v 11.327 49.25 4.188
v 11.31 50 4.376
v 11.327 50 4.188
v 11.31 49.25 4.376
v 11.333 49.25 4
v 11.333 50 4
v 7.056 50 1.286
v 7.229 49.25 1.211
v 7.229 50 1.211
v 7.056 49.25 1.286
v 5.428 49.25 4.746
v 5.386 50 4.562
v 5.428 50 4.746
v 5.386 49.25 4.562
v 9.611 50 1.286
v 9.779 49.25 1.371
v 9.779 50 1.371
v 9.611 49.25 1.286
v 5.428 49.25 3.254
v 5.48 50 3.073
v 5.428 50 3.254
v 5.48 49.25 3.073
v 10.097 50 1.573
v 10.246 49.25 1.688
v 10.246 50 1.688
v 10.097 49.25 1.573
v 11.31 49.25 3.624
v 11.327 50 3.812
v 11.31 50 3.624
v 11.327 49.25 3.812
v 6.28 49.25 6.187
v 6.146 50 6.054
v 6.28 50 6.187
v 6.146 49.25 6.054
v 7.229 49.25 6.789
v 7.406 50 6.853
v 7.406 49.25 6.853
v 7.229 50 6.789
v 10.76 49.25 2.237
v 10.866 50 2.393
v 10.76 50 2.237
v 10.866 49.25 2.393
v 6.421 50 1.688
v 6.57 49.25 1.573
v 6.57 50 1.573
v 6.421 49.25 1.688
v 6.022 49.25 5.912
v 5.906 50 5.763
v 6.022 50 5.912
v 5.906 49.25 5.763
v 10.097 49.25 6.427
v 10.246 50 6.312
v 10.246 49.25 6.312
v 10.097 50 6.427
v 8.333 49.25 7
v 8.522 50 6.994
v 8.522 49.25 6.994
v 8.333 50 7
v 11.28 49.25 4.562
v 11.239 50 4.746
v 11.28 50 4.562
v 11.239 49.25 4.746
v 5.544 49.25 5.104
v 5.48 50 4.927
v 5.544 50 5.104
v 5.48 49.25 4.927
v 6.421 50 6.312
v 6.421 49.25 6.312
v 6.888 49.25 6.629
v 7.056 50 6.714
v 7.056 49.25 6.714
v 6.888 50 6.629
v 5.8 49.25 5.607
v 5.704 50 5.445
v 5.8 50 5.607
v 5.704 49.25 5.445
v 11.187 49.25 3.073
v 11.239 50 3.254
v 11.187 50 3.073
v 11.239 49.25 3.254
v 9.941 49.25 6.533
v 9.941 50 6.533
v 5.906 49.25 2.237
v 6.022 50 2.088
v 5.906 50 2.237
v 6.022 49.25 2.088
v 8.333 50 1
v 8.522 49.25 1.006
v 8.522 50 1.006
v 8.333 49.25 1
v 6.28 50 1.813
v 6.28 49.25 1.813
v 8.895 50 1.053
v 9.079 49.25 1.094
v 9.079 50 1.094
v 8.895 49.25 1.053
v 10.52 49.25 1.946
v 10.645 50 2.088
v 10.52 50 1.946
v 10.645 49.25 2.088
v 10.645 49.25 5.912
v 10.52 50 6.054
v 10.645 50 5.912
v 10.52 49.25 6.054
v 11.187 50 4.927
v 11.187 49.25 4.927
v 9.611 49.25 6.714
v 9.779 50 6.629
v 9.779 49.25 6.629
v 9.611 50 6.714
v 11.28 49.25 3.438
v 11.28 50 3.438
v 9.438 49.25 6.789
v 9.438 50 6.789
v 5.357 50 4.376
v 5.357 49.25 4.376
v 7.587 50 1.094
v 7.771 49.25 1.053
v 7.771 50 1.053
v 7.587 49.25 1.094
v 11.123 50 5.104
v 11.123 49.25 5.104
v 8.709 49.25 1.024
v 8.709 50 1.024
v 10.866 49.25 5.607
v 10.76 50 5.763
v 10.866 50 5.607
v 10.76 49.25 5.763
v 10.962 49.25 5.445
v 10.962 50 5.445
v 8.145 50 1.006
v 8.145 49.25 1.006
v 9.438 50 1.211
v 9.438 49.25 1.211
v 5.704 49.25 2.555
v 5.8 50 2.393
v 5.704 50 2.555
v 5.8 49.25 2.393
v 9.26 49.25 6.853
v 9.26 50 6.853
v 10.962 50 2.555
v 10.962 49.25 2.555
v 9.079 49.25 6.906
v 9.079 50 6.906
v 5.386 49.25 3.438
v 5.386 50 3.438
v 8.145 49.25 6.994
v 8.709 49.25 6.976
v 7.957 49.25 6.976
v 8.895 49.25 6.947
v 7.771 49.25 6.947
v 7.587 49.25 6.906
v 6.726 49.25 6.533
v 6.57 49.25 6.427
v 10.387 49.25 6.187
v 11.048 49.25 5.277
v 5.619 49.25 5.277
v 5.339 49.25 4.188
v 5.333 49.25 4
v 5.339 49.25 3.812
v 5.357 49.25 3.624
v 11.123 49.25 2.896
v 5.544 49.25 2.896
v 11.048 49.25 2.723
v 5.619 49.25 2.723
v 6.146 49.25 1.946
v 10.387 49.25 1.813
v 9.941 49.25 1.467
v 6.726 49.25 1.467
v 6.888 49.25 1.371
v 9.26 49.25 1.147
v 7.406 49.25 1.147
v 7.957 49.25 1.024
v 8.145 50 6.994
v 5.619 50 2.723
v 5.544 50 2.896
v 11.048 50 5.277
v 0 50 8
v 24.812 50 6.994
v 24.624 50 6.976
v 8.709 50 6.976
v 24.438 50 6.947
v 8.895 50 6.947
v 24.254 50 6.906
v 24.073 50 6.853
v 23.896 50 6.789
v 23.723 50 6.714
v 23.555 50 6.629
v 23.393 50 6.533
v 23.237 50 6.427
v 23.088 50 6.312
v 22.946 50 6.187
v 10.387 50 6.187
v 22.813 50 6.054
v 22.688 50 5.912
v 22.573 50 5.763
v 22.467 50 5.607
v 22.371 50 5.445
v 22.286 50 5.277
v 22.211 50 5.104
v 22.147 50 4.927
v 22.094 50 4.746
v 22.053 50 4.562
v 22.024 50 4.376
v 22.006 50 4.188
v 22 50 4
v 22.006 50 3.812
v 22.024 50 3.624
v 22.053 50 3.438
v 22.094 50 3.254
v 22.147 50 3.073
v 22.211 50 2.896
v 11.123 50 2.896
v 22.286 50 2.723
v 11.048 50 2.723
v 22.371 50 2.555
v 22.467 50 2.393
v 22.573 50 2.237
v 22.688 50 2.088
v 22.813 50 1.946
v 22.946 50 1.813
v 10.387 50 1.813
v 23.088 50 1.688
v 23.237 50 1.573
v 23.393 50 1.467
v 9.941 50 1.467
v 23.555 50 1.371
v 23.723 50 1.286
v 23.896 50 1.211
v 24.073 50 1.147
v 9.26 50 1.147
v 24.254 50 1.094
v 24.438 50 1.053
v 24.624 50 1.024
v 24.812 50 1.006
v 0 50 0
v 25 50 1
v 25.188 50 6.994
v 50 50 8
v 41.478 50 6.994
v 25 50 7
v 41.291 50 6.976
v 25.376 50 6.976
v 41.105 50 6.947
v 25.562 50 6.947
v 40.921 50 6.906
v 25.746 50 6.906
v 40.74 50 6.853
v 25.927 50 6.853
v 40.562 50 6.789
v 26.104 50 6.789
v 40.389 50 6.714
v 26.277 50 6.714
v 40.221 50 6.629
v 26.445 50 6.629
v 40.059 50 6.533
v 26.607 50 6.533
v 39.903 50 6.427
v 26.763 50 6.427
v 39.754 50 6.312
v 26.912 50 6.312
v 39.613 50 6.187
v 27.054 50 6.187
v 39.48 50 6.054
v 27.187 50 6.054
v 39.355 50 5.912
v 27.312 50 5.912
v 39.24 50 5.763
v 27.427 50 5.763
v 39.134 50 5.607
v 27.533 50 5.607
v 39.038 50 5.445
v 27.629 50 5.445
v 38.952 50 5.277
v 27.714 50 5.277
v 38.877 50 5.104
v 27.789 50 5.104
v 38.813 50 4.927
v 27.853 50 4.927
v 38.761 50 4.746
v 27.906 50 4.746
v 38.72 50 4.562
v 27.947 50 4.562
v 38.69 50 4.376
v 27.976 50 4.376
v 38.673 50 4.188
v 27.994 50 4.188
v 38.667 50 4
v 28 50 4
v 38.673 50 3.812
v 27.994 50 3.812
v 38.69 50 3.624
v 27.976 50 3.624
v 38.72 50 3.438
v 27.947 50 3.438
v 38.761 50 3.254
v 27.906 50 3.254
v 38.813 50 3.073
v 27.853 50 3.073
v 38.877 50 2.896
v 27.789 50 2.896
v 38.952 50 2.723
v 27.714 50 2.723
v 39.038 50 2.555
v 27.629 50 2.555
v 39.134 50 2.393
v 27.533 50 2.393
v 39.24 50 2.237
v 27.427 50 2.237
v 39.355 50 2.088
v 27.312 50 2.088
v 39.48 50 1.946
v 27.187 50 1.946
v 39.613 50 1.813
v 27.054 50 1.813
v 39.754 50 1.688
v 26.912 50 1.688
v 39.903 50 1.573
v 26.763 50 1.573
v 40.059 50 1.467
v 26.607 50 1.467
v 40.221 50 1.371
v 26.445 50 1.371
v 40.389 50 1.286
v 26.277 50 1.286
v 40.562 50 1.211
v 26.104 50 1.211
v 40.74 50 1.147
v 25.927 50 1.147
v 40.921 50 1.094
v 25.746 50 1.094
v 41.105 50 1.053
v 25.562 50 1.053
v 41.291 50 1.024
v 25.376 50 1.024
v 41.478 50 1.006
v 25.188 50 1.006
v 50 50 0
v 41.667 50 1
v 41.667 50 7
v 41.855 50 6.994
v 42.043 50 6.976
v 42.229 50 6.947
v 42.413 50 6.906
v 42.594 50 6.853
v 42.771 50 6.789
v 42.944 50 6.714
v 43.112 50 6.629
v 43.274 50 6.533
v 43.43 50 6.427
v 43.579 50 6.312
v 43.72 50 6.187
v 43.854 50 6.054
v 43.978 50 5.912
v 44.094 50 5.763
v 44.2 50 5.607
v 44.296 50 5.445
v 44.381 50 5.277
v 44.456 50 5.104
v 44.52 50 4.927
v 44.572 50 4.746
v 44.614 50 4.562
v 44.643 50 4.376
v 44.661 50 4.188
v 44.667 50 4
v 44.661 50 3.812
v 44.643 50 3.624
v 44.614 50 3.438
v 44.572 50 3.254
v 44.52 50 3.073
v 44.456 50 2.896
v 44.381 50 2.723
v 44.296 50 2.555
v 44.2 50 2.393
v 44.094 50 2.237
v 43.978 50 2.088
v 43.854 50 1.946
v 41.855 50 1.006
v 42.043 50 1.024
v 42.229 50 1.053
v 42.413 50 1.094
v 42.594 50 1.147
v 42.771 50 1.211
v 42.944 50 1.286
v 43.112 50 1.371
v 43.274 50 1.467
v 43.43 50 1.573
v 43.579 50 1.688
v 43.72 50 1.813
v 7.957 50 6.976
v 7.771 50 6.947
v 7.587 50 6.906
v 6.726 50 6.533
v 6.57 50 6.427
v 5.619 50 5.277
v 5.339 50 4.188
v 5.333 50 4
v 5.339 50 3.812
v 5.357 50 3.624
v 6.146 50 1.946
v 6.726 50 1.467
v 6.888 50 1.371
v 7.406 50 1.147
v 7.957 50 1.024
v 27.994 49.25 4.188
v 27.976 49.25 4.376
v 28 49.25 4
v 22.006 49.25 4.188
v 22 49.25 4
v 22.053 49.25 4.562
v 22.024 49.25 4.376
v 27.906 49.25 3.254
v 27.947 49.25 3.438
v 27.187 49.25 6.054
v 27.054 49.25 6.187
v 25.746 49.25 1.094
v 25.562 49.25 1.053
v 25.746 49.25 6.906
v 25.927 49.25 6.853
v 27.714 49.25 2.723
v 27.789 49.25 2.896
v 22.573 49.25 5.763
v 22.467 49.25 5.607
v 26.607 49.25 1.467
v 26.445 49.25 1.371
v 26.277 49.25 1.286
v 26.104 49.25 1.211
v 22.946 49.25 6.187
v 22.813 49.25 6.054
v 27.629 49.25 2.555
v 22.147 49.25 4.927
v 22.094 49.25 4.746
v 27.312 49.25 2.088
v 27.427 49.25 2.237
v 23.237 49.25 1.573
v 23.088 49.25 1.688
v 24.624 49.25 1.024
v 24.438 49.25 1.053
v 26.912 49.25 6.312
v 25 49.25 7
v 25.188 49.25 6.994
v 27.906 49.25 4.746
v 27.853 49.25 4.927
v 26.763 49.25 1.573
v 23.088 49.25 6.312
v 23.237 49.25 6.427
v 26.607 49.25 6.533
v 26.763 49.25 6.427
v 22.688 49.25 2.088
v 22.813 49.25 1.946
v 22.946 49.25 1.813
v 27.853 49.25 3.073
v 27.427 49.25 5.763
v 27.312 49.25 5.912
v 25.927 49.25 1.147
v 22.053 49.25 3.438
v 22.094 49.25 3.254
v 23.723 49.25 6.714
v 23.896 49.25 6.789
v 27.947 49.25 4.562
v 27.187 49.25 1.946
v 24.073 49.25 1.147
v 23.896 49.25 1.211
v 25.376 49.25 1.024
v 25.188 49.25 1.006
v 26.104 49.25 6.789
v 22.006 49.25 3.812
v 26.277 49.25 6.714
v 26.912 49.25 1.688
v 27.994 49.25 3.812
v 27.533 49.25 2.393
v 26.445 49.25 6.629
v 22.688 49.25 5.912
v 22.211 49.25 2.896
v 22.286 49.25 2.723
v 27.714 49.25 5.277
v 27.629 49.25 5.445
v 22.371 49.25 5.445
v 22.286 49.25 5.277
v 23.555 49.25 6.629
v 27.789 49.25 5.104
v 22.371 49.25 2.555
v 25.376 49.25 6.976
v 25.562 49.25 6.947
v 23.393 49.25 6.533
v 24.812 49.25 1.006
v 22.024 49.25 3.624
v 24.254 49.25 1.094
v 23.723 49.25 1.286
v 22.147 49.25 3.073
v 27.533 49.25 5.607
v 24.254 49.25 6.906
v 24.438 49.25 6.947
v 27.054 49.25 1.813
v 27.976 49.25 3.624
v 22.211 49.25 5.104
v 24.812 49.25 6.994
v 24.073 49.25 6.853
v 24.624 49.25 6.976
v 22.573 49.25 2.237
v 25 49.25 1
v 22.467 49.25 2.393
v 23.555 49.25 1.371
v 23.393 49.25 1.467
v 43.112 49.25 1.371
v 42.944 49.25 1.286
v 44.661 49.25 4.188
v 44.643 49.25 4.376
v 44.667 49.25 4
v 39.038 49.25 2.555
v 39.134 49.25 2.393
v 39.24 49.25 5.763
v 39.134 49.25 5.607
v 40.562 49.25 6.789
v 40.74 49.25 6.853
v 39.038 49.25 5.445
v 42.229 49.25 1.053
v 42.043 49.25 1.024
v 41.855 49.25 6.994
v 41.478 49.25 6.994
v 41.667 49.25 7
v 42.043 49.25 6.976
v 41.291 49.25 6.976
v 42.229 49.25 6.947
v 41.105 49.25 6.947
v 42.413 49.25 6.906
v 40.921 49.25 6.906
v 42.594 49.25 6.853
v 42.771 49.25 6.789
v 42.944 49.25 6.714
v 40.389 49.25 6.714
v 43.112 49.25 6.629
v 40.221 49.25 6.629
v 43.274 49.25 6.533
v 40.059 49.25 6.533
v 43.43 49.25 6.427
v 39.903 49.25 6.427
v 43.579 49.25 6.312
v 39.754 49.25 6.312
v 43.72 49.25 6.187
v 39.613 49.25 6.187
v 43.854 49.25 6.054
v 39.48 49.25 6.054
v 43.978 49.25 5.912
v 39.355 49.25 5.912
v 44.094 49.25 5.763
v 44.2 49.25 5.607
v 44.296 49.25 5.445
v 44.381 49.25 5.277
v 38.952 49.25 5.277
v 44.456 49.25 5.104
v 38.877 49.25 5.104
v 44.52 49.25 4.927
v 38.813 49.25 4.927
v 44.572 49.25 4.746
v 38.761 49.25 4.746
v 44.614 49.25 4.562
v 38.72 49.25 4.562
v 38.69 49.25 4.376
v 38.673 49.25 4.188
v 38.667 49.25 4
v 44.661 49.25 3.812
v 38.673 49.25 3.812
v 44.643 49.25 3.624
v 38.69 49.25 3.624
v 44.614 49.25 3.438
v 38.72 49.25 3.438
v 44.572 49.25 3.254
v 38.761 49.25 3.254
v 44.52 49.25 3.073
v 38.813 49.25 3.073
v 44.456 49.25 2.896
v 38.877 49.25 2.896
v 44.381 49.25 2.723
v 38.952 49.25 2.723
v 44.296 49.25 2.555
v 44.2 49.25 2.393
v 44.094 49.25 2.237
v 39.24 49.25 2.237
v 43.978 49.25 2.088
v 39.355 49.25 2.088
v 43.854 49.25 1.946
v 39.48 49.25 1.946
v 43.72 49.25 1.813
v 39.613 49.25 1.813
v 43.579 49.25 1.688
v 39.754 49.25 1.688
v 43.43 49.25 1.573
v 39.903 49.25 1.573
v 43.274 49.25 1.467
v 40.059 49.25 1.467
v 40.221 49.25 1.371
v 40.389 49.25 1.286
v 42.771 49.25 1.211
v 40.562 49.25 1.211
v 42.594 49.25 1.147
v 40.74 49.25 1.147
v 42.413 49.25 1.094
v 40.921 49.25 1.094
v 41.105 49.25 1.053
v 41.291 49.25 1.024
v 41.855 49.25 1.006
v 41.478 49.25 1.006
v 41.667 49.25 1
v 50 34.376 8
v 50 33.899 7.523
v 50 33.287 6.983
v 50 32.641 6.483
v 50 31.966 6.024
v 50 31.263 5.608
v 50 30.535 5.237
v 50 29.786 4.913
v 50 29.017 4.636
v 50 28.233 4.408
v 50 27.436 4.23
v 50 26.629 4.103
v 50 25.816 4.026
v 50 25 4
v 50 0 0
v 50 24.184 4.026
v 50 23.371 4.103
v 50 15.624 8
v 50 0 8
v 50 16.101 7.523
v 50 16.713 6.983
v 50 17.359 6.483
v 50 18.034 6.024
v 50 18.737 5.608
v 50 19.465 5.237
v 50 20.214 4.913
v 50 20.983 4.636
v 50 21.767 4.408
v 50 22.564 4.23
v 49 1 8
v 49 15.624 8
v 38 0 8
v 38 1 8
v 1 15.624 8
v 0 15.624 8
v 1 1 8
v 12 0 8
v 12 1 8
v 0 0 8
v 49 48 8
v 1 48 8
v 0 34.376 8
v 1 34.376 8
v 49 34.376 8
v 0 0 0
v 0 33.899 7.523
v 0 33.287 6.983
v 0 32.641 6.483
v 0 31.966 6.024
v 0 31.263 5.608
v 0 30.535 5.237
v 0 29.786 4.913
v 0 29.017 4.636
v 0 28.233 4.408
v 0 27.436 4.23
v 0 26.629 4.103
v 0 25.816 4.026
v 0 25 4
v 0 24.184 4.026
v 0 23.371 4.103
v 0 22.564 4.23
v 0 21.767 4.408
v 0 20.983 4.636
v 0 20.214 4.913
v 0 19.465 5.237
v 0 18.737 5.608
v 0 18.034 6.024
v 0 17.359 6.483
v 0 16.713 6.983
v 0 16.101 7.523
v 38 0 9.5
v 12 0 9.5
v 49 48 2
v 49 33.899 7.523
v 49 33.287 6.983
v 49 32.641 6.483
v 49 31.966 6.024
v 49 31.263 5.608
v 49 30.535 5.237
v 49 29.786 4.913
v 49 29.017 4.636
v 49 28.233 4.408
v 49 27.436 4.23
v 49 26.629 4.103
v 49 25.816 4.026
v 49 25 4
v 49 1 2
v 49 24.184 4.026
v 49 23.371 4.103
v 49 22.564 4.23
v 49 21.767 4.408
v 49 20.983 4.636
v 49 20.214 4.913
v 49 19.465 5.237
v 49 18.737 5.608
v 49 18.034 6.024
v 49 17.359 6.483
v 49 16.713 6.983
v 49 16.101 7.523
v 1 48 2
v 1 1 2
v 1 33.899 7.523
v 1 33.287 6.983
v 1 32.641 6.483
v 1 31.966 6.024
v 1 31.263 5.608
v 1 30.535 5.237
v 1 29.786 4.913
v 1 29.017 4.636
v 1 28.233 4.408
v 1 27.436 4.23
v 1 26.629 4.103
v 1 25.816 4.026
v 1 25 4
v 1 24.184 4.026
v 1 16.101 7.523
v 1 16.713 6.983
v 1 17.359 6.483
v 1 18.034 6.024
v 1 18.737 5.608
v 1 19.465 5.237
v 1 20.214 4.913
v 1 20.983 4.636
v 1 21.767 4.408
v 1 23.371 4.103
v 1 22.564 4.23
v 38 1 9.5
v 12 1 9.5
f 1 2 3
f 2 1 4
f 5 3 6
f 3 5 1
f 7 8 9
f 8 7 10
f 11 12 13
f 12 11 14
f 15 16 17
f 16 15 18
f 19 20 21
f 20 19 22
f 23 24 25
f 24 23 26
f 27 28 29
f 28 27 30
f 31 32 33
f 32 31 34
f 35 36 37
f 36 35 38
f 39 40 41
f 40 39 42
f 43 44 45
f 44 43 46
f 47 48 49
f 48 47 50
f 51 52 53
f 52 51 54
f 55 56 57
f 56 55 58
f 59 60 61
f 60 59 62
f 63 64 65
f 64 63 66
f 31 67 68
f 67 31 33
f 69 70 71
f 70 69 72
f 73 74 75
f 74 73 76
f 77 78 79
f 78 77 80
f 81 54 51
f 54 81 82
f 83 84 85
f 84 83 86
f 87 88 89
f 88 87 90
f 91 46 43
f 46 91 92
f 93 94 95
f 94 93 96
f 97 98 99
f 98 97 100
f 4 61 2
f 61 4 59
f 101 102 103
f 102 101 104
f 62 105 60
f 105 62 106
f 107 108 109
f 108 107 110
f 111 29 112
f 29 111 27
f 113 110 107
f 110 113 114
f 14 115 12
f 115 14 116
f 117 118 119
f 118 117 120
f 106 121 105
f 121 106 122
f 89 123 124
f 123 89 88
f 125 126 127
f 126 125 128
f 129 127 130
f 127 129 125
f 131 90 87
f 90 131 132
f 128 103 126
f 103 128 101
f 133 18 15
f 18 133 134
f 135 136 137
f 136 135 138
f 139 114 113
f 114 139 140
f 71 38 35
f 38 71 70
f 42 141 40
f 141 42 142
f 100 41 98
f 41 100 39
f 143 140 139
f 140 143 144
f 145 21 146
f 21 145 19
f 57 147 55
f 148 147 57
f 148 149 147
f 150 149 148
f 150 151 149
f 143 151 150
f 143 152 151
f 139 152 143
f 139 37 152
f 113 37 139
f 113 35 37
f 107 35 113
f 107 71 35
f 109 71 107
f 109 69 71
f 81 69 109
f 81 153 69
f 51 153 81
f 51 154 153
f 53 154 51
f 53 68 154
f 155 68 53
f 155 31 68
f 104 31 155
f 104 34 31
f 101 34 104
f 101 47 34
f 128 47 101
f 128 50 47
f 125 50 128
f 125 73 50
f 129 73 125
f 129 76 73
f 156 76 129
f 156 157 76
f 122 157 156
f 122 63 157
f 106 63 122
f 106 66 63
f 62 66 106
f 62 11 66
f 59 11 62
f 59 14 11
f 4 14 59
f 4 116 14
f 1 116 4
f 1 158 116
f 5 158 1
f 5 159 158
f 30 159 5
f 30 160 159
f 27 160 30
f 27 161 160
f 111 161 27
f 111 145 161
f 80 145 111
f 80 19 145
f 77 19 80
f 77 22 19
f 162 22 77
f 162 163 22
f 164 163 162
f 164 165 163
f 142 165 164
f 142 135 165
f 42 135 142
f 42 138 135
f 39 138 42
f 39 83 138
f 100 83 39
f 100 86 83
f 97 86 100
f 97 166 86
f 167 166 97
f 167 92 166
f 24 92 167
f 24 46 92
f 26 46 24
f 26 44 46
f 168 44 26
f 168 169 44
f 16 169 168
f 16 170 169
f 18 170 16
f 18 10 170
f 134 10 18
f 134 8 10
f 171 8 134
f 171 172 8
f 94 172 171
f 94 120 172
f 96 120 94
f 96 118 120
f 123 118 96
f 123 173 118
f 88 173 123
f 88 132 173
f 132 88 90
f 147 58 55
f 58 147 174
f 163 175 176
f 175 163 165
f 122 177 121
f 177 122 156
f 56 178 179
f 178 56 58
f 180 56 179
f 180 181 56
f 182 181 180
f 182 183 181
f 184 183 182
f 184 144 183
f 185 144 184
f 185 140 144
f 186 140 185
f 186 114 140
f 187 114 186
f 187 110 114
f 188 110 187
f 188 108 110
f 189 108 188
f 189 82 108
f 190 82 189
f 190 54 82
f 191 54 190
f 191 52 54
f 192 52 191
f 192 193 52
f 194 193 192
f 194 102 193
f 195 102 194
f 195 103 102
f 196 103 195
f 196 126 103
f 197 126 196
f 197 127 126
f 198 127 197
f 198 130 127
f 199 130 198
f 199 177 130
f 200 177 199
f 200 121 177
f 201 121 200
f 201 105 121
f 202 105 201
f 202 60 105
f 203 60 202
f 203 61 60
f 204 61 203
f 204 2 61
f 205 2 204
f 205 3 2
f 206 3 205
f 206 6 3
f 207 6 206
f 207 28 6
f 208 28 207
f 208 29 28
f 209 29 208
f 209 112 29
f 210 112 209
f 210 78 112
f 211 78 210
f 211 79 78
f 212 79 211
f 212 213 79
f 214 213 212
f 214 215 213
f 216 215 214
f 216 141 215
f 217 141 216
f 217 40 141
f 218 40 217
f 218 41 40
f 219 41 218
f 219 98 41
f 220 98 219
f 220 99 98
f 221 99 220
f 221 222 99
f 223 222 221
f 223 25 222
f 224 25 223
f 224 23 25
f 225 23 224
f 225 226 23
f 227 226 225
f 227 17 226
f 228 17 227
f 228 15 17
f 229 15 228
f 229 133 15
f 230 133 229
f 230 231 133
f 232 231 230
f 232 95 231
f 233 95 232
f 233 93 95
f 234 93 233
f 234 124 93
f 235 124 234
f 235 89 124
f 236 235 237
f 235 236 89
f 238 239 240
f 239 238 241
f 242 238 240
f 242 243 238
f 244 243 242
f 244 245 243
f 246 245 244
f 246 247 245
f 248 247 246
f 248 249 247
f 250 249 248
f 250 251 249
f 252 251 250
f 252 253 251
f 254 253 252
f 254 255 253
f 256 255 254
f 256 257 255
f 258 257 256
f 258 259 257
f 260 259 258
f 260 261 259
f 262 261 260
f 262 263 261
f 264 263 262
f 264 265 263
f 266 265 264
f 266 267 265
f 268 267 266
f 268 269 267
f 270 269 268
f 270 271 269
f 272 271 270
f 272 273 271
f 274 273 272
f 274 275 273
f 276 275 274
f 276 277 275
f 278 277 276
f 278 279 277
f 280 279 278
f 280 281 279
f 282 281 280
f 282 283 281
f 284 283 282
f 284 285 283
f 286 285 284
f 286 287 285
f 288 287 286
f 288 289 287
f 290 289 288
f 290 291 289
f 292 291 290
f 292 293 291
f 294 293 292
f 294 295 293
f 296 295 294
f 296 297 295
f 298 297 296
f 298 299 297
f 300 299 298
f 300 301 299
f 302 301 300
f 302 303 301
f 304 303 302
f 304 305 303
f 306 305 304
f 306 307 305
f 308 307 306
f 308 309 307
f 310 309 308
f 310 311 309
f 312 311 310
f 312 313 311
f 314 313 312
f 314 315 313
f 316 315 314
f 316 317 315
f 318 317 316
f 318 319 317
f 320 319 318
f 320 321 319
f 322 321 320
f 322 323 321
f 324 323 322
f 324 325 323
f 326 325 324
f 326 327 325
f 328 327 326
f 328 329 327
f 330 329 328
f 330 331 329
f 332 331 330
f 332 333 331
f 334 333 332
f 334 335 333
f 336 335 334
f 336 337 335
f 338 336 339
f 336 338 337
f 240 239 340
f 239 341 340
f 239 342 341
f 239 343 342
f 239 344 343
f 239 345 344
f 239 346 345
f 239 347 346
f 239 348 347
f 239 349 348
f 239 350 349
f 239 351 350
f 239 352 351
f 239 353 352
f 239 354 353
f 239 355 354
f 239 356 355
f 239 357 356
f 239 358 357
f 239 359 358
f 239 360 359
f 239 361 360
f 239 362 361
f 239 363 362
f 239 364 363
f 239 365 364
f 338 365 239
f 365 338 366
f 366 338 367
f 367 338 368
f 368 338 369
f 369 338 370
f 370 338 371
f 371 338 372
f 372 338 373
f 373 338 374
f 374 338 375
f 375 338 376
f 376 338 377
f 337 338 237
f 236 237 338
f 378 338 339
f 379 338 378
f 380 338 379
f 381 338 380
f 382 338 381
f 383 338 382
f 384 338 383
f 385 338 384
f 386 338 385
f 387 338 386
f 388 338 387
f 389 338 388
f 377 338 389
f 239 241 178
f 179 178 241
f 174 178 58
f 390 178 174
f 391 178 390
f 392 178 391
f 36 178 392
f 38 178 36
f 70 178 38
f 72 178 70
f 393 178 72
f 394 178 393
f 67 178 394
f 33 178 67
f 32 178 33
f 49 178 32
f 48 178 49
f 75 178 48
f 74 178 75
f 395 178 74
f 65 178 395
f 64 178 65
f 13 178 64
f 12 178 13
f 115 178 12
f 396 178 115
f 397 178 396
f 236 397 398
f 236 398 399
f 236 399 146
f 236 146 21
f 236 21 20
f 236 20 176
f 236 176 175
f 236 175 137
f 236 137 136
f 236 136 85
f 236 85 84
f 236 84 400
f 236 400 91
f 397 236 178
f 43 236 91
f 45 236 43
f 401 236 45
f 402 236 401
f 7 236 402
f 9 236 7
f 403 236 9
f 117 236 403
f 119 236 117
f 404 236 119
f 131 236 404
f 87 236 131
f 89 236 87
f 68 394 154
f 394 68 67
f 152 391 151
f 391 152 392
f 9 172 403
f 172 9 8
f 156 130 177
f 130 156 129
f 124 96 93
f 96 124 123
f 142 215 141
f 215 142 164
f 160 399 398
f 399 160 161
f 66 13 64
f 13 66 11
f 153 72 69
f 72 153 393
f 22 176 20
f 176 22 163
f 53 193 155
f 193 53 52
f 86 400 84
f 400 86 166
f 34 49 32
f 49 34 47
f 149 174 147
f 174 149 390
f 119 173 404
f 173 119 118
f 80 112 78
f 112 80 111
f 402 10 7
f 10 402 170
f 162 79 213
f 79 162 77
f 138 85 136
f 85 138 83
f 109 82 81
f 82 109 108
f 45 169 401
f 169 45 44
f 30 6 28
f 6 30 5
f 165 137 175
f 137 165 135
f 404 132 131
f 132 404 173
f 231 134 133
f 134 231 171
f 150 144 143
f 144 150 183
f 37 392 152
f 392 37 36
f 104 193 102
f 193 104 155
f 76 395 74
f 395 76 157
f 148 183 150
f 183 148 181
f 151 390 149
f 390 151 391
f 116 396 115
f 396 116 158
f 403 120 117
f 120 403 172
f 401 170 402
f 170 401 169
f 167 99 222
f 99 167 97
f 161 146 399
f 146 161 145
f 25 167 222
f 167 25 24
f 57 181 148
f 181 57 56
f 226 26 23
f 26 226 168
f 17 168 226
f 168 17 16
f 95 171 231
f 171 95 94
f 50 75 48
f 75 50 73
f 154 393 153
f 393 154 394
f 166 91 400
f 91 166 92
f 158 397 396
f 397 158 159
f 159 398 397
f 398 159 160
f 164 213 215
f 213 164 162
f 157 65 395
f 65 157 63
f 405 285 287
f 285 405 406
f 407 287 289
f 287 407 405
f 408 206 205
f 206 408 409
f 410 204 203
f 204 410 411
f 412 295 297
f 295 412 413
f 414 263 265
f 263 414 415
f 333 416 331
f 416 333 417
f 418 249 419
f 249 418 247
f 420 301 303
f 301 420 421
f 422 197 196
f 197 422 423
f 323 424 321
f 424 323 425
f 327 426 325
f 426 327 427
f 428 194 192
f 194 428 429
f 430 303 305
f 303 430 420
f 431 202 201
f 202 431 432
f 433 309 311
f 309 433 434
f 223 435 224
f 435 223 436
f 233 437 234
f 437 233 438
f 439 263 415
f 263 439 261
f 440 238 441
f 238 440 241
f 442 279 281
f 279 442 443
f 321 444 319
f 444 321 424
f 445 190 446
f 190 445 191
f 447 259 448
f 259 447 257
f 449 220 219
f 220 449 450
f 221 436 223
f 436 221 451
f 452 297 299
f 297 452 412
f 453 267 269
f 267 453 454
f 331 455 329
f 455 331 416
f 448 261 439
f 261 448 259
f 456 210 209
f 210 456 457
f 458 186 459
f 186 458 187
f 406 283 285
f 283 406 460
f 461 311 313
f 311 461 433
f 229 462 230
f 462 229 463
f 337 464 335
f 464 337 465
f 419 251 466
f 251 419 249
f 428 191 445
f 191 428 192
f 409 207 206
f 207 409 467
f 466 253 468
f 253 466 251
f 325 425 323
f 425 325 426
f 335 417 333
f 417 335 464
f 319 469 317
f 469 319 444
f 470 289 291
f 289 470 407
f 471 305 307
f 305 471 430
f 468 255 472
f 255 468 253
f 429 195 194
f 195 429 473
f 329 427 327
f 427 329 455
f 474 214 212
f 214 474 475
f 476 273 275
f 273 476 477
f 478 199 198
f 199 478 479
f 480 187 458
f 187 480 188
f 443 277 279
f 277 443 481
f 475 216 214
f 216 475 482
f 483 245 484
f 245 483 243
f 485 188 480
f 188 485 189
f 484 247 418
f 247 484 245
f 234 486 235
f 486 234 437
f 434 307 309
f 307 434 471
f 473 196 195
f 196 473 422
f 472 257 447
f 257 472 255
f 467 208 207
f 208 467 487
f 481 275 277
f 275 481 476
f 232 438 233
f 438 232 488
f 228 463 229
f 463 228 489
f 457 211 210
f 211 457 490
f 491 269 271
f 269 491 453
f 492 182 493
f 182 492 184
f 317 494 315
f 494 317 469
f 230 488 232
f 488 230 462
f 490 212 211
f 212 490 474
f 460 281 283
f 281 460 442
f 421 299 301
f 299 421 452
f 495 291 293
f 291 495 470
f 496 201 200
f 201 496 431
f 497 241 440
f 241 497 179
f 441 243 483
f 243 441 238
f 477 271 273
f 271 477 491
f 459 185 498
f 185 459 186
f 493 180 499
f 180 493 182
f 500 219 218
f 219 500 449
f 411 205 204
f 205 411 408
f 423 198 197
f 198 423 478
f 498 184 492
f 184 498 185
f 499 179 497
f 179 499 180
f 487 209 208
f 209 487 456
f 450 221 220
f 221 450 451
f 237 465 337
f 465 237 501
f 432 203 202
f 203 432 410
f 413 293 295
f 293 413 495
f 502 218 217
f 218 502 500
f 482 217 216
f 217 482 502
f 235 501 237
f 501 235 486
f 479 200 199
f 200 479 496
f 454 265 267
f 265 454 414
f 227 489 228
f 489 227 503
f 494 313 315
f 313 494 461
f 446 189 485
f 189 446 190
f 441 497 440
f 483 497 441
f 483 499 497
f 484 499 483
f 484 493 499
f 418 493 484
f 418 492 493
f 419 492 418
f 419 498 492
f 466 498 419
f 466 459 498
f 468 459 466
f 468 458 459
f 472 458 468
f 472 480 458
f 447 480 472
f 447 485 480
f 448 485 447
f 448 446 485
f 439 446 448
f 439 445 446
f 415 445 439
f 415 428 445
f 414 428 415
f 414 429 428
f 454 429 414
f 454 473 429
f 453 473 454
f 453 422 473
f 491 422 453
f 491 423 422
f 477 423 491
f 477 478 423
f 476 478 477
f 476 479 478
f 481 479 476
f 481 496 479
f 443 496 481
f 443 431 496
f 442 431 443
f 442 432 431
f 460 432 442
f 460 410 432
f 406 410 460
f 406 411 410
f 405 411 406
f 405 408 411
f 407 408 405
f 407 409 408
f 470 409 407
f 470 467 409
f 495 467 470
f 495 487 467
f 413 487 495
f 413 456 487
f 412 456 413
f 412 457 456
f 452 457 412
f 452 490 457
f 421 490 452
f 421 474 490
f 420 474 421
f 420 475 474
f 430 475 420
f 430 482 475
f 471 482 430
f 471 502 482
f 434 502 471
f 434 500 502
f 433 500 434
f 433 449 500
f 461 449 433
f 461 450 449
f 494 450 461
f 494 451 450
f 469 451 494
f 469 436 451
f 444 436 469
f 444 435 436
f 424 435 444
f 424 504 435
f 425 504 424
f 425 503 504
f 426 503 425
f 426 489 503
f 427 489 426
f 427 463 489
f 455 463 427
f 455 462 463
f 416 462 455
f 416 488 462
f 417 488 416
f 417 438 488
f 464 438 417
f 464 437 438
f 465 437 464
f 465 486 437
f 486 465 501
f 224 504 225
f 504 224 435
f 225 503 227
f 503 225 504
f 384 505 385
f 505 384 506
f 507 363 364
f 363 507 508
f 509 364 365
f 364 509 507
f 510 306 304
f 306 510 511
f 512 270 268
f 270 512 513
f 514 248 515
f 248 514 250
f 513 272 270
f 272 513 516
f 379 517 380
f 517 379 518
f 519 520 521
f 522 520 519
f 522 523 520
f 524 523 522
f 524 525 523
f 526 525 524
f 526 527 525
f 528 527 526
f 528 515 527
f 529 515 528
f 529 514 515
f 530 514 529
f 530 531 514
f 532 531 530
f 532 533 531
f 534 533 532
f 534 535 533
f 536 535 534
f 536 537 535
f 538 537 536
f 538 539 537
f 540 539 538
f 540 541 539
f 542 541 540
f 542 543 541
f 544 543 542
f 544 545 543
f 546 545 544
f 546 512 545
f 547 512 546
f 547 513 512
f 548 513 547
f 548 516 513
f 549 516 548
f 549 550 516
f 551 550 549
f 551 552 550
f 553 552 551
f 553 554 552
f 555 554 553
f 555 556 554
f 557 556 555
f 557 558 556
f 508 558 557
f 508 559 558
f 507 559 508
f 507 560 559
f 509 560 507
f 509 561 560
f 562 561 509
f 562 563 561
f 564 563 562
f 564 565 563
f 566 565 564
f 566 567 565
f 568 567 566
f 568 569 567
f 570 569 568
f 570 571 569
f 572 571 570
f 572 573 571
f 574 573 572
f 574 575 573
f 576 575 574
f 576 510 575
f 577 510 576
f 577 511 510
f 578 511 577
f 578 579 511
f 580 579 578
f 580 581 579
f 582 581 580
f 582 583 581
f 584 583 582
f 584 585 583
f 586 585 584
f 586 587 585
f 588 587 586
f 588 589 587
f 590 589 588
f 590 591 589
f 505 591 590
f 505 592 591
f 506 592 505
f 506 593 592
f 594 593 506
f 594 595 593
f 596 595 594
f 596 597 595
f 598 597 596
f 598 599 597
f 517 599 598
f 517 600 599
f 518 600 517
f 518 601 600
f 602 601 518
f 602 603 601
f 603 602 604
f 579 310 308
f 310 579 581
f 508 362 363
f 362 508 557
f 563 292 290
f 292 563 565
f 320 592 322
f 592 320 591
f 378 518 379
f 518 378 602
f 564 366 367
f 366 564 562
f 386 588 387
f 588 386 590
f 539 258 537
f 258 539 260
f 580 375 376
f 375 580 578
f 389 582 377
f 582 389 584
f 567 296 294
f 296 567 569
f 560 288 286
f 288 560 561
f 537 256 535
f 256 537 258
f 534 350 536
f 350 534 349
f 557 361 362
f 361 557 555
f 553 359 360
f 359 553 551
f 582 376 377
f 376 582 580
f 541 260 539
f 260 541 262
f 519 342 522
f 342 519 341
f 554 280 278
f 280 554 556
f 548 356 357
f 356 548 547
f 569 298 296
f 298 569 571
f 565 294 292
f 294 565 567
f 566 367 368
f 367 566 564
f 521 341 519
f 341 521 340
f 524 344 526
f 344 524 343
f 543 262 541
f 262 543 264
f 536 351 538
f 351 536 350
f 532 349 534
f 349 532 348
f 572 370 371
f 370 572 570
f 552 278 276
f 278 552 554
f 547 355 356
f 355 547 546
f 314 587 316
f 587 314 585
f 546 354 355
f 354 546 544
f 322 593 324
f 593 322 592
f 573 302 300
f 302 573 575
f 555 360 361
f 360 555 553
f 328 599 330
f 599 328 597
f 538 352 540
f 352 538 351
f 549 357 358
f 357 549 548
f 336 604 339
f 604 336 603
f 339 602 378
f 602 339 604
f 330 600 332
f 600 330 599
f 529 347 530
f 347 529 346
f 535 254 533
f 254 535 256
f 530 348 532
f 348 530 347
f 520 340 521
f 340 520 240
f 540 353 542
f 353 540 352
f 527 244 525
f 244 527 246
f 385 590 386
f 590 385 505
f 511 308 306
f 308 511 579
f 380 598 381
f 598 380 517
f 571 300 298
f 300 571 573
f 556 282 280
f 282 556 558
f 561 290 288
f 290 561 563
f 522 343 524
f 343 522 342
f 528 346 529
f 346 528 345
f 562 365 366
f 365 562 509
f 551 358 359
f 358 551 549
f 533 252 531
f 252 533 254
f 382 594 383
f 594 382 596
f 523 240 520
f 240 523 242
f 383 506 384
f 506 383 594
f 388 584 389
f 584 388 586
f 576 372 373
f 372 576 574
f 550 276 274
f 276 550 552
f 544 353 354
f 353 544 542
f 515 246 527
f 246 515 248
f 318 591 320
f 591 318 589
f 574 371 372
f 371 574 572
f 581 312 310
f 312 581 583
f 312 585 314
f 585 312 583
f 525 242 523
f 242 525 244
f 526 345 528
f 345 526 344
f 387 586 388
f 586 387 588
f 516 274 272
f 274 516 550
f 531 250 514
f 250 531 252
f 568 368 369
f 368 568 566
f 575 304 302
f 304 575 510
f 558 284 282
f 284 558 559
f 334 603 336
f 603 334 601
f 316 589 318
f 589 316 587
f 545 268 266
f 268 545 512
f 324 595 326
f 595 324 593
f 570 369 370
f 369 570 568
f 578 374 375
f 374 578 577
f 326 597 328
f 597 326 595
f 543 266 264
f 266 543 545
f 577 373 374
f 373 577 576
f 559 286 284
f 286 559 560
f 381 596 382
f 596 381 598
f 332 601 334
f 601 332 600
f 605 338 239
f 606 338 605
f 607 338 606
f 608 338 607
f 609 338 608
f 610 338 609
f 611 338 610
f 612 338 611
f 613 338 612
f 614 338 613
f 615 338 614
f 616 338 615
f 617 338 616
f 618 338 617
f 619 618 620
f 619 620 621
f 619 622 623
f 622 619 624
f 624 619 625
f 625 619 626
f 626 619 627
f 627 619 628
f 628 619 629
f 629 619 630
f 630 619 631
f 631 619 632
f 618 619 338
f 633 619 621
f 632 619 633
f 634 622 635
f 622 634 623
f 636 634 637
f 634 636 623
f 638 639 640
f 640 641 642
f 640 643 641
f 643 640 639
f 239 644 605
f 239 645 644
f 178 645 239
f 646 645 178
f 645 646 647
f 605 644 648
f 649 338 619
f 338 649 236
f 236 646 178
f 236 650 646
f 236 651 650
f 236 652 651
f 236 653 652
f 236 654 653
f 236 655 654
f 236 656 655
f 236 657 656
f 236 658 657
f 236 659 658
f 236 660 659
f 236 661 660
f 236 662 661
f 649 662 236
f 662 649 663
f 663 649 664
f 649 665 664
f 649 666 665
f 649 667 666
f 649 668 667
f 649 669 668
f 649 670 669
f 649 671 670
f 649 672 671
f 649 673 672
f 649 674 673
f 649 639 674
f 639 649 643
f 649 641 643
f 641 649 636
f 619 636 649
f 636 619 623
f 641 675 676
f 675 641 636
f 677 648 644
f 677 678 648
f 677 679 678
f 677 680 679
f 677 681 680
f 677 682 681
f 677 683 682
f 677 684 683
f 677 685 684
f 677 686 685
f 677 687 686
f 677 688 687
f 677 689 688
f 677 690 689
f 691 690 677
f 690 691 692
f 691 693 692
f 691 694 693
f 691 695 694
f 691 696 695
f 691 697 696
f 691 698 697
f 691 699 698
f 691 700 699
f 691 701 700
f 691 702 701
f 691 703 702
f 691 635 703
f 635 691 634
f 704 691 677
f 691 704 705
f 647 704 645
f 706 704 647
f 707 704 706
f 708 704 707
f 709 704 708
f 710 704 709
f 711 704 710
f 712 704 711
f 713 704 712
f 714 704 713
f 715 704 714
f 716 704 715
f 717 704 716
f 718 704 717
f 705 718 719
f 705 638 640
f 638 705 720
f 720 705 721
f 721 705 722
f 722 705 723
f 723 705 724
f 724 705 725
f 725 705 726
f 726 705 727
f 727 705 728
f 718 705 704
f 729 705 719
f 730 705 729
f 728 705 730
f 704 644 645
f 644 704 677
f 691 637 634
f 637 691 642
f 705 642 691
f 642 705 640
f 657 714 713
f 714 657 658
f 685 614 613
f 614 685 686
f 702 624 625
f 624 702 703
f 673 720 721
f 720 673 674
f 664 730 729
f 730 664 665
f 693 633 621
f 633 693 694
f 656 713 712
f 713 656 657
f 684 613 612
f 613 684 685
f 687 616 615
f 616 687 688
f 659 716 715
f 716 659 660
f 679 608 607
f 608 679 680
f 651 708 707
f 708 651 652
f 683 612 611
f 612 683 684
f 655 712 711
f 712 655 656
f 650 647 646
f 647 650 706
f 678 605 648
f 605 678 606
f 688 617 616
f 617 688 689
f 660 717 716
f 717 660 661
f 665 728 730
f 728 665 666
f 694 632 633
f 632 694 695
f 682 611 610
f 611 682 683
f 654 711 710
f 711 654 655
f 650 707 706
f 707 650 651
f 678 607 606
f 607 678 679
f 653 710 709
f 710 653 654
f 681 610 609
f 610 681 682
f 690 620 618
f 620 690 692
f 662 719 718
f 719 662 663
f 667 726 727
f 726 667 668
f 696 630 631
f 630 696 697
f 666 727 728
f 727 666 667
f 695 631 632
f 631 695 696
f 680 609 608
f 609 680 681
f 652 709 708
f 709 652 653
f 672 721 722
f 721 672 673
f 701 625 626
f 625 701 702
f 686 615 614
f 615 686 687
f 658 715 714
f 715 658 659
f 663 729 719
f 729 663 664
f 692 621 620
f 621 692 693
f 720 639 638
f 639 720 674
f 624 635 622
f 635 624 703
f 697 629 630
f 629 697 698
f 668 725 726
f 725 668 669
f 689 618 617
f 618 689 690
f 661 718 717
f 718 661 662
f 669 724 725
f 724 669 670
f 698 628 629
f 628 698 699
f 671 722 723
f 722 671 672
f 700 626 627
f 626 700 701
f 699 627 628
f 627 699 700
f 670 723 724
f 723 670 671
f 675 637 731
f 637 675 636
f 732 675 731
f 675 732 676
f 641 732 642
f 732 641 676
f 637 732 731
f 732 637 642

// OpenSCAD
$fn=100;

CPU_LENGTH = 50; // X
CPU_WIDTH = 50; // Y
CPU_HEIGHT = 5; // Z
CPU_ADDITIONAL_HEIGHT = 3;
BASE_HEIGHT = 2;
WALL_SIDE_HEIGHT = 1;
WALL_BACK_HEIGHT = 1.5;
WALL_PICK_LENGTH = (CPU_LENGTH/2)+1;
WALL_PICK_HEIGHT = 1.5;
NUM_CILIDENRS_CUT = 3;

difference() {
    cube([CPU_LENGTH, CPU_WIDTH, CPU_HEIGHT + CPU_ADDITIONAL_HEIGHT]);
    translate([WALL_SIDE_HEIGHT, WALL_SIDE_HEIGHT, BASE_HEIGHT]){
        cube([CPU_LENGTH-(2*WALL_SIDE_HEIGHT), CPU_WIDTH-(2*WALL_BACK_HEIGHT), 40]);
    }
    translate([0, CPU_WIDTH/2, CPU_HEIGHT+BASE_HEIGHT+10]){
        rotate([90, 0, 90]){
            cylinder(CPU_LENGTH, 13, 13);
        }
    }
    for ( i = [0 : NUM_CILIDENRS_CUT - 1] ){
        translate([(CPU_LENGTH/NUM_CILIDENRS_CUT*i) + (CPU_LENGTH/NUM_CILIDENRS_CUT/2), CPU_WIDTH, (CPU_HEIGHT + CPU_ADDITIONAL_HEIGHT) / 2]){
            rotate([90, 0, 0]){
                cylinder(WALL_BACK_HEIGHT/2, 3, 3);
            }
        }
    }
}
translate([(CPU_LENGTH - WALL_PICK_LENGTH) / 2, 0, CPU_HEIGHT + CPU_ADDITIONAL_HEIGHT]){
    cube([WALL_PICK_LENGTH , WALL_SIDE_HEIGHT, WALL_BACK_HEIGHT]);
}
